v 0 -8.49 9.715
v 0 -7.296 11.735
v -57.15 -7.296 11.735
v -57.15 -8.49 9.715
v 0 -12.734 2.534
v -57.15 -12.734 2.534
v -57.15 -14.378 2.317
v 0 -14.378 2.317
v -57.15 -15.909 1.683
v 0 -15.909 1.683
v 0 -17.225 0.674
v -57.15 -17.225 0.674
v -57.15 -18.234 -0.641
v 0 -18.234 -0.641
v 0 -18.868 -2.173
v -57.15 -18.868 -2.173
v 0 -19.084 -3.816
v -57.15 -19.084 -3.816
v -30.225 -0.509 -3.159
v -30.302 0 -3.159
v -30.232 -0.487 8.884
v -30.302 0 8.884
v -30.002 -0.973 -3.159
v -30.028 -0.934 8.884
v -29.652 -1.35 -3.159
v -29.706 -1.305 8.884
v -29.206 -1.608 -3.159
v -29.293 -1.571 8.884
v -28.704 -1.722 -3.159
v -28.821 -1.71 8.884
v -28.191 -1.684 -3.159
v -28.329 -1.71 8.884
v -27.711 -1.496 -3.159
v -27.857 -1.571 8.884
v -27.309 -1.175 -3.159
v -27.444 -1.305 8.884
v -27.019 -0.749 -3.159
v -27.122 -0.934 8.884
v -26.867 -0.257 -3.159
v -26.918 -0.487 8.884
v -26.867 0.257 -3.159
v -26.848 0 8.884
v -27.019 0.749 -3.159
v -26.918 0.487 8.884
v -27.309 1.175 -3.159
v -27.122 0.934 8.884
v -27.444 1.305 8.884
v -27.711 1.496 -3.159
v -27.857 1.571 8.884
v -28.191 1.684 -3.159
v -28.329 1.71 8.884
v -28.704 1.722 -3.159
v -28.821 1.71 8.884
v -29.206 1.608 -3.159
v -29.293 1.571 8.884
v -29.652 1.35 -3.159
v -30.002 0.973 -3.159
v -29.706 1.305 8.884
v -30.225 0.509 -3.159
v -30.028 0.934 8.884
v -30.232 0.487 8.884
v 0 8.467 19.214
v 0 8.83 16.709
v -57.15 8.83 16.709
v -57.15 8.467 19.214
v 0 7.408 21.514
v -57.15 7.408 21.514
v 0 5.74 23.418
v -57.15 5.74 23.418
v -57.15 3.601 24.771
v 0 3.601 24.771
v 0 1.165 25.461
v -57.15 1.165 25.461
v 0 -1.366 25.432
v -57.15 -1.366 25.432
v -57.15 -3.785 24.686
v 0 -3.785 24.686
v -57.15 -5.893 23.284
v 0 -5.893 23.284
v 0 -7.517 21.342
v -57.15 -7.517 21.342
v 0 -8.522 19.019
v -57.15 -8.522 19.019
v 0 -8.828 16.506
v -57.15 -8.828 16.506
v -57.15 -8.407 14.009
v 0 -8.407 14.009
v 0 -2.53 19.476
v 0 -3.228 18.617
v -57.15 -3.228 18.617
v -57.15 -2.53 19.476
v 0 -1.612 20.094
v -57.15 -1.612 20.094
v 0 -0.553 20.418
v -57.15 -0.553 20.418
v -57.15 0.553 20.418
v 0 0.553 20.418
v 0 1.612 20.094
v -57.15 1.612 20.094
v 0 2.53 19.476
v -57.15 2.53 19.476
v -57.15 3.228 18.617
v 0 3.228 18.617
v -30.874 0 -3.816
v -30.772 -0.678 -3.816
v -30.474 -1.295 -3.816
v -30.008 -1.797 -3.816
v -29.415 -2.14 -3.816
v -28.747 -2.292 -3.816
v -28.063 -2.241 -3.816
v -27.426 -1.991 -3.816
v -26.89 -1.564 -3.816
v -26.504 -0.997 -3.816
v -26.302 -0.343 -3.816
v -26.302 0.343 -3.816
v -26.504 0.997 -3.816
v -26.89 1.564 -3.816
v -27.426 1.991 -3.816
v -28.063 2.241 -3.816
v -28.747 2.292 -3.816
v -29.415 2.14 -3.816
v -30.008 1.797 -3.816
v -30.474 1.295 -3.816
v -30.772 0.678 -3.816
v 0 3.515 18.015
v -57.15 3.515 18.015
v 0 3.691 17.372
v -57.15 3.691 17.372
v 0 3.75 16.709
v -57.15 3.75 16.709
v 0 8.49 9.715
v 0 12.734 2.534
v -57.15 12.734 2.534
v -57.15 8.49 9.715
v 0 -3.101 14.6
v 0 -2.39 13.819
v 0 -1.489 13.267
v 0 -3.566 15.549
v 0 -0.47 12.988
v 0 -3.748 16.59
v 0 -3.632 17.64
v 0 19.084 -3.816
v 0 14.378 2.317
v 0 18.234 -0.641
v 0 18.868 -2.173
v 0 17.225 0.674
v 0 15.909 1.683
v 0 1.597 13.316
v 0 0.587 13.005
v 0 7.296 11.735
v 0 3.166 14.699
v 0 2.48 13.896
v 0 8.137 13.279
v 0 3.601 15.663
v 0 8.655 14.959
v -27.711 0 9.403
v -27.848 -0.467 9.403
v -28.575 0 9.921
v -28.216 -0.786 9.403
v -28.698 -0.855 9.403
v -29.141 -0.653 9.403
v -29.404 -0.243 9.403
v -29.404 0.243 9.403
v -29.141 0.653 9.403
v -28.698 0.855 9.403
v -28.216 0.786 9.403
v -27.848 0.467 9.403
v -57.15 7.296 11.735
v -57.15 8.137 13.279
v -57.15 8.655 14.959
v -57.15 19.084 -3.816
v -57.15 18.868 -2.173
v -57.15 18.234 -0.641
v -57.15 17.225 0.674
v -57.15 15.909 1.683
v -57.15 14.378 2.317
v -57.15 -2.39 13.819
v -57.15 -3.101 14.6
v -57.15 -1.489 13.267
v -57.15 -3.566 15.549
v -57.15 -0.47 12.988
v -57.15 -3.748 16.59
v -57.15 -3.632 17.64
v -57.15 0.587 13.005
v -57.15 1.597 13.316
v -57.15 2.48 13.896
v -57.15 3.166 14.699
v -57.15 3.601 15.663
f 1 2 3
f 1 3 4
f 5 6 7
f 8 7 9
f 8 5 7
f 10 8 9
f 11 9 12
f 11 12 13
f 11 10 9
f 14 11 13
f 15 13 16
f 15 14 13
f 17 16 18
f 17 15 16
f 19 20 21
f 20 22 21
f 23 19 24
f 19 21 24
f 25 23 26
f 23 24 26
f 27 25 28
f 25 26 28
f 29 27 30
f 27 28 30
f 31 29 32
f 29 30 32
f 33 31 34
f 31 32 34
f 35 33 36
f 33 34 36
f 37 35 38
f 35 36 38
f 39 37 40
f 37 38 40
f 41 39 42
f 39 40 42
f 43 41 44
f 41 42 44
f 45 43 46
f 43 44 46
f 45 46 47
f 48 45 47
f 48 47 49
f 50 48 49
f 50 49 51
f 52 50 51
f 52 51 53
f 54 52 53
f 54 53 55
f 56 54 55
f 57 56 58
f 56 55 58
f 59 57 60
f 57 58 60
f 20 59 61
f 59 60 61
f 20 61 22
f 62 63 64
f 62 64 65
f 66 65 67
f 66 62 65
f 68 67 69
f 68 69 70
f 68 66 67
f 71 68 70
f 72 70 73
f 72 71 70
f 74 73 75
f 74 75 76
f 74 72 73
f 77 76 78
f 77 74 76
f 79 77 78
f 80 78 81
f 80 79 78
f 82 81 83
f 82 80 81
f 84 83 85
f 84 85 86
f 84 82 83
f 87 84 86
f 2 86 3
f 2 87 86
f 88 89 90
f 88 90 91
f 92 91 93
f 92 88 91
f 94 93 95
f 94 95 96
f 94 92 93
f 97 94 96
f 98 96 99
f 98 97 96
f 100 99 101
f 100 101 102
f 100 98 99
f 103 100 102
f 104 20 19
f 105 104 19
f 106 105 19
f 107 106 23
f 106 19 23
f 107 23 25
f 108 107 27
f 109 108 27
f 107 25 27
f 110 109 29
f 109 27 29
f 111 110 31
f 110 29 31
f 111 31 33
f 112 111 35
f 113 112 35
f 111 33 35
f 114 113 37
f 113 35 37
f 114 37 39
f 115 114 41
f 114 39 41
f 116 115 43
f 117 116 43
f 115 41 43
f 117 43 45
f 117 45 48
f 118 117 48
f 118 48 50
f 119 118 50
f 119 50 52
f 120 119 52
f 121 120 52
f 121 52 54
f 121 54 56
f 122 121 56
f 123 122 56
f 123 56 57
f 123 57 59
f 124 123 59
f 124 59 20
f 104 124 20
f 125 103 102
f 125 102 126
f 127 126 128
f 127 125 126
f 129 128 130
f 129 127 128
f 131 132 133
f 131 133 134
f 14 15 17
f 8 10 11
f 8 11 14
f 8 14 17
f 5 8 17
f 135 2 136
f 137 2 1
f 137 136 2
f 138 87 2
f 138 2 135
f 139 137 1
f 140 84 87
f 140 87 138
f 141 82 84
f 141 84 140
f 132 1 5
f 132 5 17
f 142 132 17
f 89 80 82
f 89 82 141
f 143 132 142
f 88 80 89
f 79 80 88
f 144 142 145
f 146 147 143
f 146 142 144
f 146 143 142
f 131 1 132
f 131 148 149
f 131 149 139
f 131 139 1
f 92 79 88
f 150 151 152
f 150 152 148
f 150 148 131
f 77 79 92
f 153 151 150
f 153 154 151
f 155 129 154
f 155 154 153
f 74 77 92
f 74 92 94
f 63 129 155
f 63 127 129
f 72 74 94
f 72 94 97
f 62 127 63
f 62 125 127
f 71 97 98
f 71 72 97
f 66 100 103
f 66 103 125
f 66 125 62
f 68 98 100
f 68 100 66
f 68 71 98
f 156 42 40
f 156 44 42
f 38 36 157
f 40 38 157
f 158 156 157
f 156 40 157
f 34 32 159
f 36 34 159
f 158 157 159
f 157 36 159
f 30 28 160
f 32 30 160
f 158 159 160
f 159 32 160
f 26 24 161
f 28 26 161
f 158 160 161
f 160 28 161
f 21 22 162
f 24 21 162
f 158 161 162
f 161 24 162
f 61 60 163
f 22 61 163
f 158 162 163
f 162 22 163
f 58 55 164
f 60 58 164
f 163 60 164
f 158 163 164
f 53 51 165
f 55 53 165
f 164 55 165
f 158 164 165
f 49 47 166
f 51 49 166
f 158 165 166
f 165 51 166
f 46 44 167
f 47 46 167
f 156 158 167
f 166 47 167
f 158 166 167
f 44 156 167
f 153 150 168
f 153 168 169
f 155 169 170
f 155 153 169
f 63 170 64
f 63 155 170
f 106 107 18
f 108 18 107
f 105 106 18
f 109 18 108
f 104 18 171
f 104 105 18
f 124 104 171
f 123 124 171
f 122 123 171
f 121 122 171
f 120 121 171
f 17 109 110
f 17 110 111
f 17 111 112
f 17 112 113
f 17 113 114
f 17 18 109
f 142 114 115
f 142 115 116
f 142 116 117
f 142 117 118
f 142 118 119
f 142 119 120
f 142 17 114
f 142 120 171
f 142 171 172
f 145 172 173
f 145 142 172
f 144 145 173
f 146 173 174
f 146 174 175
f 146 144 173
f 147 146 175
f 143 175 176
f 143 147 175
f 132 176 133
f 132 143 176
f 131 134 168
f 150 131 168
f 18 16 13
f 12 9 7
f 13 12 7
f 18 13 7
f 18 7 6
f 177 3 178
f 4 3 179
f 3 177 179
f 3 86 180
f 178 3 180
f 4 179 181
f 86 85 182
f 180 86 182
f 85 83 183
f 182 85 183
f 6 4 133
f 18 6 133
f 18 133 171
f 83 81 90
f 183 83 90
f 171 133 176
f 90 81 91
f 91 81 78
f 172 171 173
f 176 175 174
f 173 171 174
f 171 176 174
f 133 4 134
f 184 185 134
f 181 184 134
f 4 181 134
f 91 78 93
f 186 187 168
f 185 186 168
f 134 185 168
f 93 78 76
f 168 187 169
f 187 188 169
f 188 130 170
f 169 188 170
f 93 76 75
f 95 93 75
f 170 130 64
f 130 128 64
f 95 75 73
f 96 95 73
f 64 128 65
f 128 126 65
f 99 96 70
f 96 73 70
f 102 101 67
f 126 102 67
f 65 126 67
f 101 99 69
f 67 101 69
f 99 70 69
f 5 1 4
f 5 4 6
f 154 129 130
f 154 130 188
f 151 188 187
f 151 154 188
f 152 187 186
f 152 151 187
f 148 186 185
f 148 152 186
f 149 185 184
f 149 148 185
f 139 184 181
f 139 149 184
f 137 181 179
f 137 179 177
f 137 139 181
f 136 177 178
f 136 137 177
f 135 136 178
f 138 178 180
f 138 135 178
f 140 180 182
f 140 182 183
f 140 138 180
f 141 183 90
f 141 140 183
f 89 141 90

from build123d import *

# Parameters (mm, degrees)
F0_W           = 8.4991231561
F0_H           = 6.35
F1_DEPTH       = 57.15
F3_D           = 3.4544
F3_DEPTH       = 12.7
F3_CSINK_D     = 4.5974
F3_CSINK_ANGLE = 82
F3_TIP         = 1.0378064612


with BuildPart() as f1:
    # F0 (on Right) → F1 (new body)
    with BuildSketch(Plane.YZ):
        with BuildLine():
            Line((-8.4991231561, 2.5336752819), (-12.7344833851, 2.5336752819))
            ThreePointArc((-12.7344833851, 2.5336752819), (-17.2246114456, 0.6738033425), (-19.0844833851, -3.8163247181))
            Line((-19.0844833851, -3.8163247181), (-8.4991231561, -3.8163247181))
            Line((-8.4991231561, -3.8163247181), (-8.4991231561, 2.5336752819))
        make_face()
        with Locations((-4.249561578, -0.6413247181)):
            Rectangle(F0_W, F0_H)
        with Locations((4.249561578, -0.6413247181)):
            Rectangle(F0_W, F0_H)
        with BuildLine():
            ThreePointArc((19.0844833851, -3.8163247181), (17.2246114456, 0.6738033425), (12.7344833851, 2.5336752819))
            Line((12.7344833851, 2.5336752819), (8.4991231561, 2.5336752819))
            Line((8.4991231561, 2.5336752819), (8.4991231561, -3.8163247181))
            Line((8.4991231561, -3.8163247181), (19.0844833851, -3.8163247181))
        make_face()
        with BuildLine():
            ThreePointArc((8.4901041675, 9.7145254963), (0, 5.7086752819), (-8.4901041675, 9.7145254963))
            Line((-8.4901041675, 9.7145254963), (-12.7344833851, 2.5336752819))
            Line((-12.7344833851, 2.5336752819), (-8.4991231561, 2.5336752819))
            Line((-8.4991231561, 2.5336752819), (0, 2.5336752819))
            Line((0, 2.5336752819), (8.4991231561, 2.5336752819))
            Line((8.4991231561, 2.5336752819), (12.7344833851, 2.5336752819))
            Line((12.7344833851, 2.5336752819), (8.4901041675, 9.7145254963))
        make_face()
        with BuildLine():
            Line((-7.2959219906, 11.7349018344), (-8.4901041675, 9.7145254963))
            ThreePointArc((-8.4901041675, 9.7145254963), (0, 5.7086752819), (8.4901041675, 9.7145254963))
            Line((8.4901041675, 9.7145254963), (7.2959219906, 11.7349018344))
            ThreePointArc((7.2959219906, 11.7349018344), (0, 7.8786752819), (-7.2959219906, 11.7349018344))
        make_face()
        with BuildLine():
            ThreePointArc((8.83, 16.7086752819), (-2.6024900406, 25.1464442755), (-7.2959219906, 11.7349018344))
            Line((-7.2959219906, 11.7349018344), (-3.2282481135, 18.6167932336))
            ThreePointArc((-3.2282481135, 18.6167932336), (0, 20.4586752819), (3.2282481135, 18.6167932336))
            Line((3.2282481135, 18.6167932336), (7.2959219906, 11.7349018344))
            ThreePointArc((7.2959219906, 11.7349018344), (8.4377689935, 14.1061852413), (8.83, 16.7086752819))
        make_face()
        with BuildLine():
            Line((-3.2282481135, 18.6167932336), (-7.2959219906, 11.7349018344))
            ThreePointArc((-7.2959219906, 11.7349018344), (0, 7.8786752819), (7.2959219906, 11.7349018344))
            Line((7.2959219906, 11.7349018344), (3.2282481135, 18.6167932336))
            ThreePointArc((3.2282481135, 18.6167932336), (3.6172109716, 17.6977580829), (3.75, 16.7086752819))
            ThreePointArc((3.75, 16.7086752819), (-0.9890828009, 13.0914643104), (-3.2282481135, 18.6167932336))
        make_face()
    extrude(amount=-F1_DEPTH)

    # F3
    with Locations(Plane(origin=(0, 0, -3.8163247181), x_dir=(1, 0, 0), z_dir=(0, 0, -1))):
        with Locations((-28.575, 0)):
            CounterSinkHole(F3_D / 2, F3_CSINK_D / 2, depth=F3_DEPTH, counter_sink_angle=F3_CSINK_ANGLE)
            with Locations((0, 0, -(F3_DEPTH + F3_TIP / 2))):  # 118° drill point
                Cone(0, F3_D / 2, F3_TIP, mode=Mode.SUBTRACT)


solid = f1.part
